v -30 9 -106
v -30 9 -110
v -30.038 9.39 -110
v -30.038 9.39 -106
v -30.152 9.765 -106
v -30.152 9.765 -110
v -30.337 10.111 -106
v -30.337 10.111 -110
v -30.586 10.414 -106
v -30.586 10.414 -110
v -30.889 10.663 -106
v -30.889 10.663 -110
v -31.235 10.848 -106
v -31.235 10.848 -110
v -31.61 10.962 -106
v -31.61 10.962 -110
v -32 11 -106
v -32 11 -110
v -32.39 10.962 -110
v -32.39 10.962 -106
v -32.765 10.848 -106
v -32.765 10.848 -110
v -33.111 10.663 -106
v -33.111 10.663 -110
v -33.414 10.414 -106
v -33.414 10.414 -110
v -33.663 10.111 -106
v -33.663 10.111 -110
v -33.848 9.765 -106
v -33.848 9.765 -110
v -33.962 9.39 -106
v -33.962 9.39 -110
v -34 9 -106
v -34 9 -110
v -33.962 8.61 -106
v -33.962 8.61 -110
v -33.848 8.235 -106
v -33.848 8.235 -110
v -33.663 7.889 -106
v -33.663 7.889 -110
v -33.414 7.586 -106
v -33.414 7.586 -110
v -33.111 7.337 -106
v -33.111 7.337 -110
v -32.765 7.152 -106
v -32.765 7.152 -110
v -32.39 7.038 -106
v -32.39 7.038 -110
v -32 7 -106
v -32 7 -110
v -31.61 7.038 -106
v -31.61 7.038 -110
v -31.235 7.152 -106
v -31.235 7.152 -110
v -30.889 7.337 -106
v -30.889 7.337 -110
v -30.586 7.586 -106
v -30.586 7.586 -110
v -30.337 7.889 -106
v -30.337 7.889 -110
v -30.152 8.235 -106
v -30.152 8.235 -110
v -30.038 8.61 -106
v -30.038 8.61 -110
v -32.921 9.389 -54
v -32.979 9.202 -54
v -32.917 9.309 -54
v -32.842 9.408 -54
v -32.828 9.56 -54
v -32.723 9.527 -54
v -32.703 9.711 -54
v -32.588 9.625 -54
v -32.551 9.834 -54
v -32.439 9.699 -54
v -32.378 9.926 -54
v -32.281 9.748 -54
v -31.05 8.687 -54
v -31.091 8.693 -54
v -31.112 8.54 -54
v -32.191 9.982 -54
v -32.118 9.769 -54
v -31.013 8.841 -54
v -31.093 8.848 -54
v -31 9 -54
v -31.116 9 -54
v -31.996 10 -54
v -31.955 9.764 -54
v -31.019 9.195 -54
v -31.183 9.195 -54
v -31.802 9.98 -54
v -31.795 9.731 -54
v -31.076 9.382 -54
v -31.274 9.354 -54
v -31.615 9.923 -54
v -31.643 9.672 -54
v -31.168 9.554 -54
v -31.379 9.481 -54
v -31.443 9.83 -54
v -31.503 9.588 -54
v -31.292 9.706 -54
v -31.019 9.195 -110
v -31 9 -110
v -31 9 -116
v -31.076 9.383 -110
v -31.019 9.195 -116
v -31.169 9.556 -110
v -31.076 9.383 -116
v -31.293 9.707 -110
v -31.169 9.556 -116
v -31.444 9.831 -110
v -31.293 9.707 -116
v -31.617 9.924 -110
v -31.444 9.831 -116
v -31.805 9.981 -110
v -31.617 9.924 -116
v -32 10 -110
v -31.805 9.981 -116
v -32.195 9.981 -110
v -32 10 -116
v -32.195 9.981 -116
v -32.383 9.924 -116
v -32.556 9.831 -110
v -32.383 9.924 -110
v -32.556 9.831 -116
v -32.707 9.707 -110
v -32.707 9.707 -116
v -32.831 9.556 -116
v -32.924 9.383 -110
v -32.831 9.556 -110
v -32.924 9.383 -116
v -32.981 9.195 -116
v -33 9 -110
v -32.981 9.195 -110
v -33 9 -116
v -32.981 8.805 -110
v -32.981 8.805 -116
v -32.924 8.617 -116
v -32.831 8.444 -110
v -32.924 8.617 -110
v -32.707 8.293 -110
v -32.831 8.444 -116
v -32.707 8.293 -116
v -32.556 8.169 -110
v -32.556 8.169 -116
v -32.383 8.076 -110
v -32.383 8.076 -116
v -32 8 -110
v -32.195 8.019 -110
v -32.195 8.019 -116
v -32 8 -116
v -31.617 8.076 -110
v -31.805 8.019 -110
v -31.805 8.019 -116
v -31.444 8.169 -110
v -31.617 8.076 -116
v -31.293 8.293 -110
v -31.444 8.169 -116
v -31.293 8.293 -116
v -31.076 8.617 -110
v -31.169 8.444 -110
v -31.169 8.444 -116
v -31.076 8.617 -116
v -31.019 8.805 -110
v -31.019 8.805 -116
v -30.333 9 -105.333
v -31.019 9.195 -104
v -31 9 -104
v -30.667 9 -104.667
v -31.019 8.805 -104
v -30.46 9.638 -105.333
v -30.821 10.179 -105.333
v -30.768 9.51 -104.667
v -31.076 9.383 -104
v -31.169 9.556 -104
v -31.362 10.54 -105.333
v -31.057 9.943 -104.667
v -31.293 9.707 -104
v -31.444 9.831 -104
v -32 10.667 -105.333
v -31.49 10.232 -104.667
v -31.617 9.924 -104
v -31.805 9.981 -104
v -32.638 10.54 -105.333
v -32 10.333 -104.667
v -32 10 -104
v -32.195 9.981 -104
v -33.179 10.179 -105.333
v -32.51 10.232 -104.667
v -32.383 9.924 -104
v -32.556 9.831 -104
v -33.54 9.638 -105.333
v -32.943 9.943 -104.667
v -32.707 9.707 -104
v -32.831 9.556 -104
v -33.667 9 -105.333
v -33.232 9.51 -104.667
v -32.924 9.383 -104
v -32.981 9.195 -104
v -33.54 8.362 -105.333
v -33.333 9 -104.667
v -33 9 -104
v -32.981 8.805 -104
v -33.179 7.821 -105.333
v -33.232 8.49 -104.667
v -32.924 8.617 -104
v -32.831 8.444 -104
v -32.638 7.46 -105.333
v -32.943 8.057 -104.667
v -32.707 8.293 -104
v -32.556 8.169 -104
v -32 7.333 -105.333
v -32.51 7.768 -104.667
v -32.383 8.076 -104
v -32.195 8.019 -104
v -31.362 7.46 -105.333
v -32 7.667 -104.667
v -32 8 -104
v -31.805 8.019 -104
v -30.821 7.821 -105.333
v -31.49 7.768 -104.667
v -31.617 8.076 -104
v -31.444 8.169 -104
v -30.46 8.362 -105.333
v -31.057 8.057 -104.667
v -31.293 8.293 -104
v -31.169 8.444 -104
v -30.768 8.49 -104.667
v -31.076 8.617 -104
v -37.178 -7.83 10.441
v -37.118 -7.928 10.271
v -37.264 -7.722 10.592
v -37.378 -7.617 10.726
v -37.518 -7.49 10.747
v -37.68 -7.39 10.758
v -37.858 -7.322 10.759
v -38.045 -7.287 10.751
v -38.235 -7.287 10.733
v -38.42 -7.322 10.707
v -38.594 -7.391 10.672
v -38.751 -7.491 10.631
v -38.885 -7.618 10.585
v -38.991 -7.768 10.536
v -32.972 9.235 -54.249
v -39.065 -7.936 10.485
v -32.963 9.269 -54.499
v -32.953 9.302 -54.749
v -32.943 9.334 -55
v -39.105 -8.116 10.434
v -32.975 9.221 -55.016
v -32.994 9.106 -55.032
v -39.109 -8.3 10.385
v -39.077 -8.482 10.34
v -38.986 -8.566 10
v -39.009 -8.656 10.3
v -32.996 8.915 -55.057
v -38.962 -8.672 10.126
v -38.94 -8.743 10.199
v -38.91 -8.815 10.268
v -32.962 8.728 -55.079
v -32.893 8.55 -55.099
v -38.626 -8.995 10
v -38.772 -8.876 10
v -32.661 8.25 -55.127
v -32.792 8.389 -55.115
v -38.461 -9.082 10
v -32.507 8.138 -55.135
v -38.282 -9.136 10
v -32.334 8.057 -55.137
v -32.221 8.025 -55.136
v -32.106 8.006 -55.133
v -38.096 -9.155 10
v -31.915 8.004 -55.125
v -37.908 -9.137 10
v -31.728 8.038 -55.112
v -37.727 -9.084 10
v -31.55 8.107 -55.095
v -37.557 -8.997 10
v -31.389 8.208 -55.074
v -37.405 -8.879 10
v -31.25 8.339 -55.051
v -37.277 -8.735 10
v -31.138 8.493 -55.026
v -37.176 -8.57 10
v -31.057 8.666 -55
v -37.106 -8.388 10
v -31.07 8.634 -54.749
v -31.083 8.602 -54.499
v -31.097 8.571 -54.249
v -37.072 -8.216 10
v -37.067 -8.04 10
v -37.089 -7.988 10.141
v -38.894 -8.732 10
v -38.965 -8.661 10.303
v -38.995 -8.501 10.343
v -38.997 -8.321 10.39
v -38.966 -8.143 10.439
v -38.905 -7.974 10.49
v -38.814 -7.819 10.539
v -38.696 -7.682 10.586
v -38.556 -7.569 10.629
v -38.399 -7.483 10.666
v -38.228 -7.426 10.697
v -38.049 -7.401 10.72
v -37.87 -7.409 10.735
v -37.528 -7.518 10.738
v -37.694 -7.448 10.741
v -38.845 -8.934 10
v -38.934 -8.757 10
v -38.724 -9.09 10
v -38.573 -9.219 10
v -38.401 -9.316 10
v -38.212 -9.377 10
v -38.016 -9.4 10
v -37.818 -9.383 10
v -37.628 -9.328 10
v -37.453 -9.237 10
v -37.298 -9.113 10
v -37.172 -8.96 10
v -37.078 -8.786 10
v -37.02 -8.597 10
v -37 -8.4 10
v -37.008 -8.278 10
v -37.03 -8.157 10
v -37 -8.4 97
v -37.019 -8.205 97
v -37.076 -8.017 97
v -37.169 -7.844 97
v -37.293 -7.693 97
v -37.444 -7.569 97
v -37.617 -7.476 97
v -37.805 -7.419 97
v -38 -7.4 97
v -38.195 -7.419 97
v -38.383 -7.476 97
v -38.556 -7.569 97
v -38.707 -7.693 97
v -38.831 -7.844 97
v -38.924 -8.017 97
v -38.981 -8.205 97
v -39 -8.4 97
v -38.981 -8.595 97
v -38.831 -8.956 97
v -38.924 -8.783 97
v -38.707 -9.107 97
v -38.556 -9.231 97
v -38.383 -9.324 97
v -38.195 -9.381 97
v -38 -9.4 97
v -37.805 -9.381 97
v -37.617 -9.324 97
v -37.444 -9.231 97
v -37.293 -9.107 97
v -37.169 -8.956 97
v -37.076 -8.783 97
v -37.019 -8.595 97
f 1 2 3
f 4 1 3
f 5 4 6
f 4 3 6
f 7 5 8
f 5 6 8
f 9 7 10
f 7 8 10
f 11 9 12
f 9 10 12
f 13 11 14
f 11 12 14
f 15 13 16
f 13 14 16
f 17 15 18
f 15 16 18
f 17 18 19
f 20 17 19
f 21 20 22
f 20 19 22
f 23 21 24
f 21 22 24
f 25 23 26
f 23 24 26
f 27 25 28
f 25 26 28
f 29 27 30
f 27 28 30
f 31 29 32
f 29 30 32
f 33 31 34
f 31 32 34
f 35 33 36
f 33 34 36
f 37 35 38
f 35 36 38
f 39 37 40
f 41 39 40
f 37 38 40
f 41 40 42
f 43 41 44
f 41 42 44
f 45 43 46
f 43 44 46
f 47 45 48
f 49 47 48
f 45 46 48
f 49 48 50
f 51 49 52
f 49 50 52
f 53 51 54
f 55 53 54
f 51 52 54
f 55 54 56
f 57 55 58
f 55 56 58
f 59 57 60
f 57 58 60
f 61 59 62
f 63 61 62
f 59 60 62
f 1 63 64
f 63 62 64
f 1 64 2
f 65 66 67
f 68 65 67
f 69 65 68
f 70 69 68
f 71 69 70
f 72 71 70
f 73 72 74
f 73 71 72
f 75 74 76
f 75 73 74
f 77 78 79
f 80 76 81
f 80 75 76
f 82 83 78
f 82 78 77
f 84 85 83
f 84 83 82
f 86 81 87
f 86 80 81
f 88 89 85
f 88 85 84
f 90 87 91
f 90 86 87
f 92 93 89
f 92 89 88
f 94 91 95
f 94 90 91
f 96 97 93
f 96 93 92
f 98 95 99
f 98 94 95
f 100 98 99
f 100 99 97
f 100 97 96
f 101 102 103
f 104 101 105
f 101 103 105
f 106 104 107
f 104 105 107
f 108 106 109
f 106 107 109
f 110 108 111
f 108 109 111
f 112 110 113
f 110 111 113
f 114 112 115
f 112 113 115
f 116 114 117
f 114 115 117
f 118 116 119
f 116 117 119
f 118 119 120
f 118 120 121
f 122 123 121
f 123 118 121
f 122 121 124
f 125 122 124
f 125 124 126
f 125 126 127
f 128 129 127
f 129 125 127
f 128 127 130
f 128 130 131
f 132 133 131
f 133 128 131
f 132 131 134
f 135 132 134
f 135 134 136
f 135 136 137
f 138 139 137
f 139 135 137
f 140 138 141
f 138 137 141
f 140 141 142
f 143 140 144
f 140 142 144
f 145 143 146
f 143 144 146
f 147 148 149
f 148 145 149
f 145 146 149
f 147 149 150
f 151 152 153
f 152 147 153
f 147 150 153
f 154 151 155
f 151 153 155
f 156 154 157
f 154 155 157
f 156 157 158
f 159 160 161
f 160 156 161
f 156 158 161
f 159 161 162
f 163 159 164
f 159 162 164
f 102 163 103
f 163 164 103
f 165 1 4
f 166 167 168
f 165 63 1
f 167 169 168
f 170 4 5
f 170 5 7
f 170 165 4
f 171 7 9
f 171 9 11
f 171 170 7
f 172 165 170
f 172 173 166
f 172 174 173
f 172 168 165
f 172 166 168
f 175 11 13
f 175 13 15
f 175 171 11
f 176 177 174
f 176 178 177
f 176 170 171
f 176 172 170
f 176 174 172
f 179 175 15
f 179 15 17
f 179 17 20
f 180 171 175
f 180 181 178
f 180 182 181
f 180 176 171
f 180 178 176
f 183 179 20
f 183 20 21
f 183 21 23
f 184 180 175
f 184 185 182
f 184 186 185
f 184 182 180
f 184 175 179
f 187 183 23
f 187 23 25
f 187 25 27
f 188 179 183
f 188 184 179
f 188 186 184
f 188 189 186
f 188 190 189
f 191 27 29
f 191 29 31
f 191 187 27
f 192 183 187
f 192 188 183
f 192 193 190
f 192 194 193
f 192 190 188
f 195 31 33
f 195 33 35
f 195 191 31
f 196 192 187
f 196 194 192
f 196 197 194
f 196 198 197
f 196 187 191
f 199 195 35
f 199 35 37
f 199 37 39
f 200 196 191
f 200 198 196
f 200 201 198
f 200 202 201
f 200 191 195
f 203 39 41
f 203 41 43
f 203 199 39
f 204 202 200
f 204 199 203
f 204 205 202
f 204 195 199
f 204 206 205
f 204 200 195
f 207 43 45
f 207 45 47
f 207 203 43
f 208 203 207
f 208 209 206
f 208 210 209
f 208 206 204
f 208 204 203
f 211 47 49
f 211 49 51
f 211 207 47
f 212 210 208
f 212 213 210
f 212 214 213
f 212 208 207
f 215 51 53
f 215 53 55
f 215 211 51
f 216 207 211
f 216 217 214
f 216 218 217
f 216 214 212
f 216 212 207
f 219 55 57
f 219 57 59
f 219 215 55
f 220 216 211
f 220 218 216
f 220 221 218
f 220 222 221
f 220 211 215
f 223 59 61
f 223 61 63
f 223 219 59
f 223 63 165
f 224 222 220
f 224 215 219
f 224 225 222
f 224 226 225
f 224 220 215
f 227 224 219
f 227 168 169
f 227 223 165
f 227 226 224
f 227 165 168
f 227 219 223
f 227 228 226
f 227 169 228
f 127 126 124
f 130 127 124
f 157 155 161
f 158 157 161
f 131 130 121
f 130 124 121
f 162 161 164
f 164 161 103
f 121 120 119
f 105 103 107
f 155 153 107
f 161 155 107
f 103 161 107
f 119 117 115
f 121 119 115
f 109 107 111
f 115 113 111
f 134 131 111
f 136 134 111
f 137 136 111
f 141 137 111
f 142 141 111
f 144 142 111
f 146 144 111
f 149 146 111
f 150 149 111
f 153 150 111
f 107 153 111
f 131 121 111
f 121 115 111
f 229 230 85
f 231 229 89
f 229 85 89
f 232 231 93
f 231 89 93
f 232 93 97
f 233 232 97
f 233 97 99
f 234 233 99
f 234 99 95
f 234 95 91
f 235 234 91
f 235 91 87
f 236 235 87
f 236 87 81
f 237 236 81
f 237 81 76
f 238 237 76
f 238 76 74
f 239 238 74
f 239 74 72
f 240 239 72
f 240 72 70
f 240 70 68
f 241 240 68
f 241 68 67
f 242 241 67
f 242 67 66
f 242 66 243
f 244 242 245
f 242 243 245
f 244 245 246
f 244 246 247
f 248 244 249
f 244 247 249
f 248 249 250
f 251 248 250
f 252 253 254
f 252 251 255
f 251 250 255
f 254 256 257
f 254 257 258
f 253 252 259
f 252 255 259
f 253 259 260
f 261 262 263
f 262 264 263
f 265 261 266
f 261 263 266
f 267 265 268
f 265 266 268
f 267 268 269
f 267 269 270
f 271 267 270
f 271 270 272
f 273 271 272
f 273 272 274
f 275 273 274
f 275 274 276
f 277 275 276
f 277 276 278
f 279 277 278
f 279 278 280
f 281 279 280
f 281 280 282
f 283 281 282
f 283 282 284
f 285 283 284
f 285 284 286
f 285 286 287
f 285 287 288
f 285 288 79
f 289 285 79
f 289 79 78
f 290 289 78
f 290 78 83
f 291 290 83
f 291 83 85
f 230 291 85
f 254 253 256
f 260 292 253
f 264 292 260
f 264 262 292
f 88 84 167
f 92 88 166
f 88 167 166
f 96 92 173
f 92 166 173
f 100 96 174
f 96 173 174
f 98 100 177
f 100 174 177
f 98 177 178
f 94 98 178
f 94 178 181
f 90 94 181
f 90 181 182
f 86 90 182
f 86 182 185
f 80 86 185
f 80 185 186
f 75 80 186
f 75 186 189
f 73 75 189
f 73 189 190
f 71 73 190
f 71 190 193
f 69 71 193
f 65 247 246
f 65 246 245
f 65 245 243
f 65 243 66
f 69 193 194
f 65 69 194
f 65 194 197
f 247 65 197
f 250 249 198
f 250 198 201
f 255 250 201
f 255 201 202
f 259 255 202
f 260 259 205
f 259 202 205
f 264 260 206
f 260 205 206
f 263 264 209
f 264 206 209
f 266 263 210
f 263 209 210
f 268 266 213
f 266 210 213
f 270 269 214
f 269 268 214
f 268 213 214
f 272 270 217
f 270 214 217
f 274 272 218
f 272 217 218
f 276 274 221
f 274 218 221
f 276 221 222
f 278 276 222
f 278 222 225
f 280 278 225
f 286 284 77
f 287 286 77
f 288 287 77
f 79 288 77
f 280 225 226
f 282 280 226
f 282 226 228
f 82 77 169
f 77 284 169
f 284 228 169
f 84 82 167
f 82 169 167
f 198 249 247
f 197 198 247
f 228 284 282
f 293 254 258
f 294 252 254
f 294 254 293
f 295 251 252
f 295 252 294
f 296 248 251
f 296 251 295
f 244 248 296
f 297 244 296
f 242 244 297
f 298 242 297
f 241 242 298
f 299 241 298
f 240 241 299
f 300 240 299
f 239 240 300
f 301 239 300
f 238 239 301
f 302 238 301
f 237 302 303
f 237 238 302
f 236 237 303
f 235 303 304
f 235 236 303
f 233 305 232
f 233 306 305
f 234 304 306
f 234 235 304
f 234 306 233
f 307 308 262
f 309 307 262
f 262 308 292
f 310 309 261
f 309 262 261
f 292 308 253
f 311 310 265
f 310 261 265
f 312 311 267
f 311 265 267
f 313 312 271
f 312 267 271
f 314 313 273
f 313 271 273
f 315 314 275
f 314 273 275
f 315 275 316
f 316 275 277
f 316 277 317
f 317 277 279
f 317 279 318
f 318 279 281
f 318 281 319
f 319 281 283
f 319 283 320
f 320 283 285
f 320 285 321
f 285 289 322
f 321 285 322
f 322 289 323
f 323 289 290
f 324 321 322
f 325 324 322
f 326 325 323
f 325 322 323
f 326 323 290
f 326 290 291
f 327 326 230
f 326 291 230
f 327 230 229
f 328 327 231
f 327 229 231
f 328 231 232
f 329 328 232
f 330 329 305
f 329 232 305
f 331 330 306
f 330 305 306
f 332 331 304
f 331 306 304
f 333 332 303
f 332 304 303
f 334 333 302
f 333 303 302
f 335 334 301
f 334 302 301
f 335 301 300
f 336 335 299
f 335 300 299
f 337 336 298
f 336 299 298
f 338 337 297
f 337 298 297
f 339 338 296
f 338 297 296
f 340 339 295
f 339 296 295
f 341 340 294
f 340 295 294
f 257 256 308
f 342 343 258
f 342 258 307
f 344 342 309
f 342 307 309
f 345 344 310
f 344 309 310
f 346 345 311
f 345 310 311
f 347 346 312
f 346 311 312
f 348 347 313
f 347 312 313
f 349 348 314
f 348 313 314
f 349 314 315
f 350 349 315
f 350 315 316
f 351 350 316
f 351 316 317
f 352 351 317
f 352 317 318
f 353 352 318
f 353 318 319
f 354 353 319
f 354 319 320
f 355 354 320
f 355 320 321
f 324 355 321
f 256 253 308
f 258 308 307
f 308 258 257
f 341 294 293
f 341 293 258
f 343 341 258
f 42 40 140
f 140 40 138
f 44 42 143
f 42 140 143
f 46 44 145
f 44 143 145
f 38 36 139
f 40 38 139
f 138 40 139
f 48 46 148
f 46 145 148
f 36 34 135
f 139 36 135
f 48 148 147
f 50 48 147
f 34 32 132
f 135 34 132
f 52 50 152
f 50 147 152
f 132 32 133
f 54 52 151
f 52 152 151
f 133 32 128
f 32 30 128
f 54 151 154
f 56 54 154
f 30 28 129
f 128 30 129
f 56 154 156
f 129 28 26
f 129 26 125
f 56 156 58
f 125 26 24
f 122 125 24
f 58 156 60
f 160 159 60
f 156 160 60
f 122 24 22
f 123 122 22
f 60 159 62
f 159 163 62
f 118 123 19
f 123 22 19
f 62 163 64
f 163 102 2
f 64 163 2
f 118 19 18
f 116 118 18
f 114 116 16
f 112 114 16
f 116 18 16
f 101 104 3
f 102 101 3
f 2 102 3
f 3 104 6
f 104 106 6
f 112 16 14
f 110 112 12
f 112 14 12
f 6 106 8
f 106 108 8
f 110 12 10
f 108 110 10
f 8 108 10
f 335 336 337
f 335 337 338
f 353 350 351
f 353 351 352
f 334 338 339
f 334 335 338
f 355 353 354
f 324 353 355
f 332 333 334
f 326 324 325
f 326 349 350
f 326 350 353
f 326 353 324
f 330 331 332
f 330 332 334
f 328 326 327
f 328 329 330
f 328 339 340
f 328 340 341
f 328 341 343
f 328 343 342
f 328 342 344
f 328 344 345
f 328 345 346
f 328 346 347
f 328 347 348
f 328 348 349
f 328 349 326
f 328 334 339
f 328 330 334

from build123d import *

# Parameters (mm, degrees)
CYLINDER068_R               = 1
CYLINDER068_DEPTH           = 68
CYLINDER068_ROLL_ANGLE      = 13.101784
CYLINDER068_PITCH_ANGLE     = -8.567577
CYLINDER068_PLACEMENT_ANGLE = 13.101784
CYLINDER054_R               = 1
CYLINDER054_DEPTH           = 50
CYLINDER065_R               = 1
CYLINDER065_DEPTH           = 87
CYLINDER052_R               = 2
CYLINDER052_DEPTH           = 4
CYLINDER053_R               = 1
CYLINDER053_DEPTH           = 8


with BuildPart() as cylindre064:
    # Cylinder068 → Cylinder068 (new body)
    with BuildSketch(Plane.XY):
        Circle(CYLINDER068_R)
    extrude(amount=CYLINDER068_DEPTH)


with BuildPart() as cylindre064_1:
    # Cylinder068 roll: moved
    add(cylindre064.part.rotate(Axis((0, 0, 0), (1, 0, 0)), CYLINDER068_ROLL_ANGLE))


with BuildPart() as cylindre064_2:
    # Cylinder068 pitch: moved
    add(cylindre064_1.part.rotate(Axis((0, 0, 0), (0, 1, 0)), CYLINDER068_PITCH_ANGLE))


with BuildPart() as cylindre064_3:
    # Cylinder068 placement: moved
    add(cylindre064_2.part.moved(Location((-32, 9, -55))).rotate(Axis((-32, 9, -55), (0, 0, 1)), CYLINDER068_PLACEMENT_ANGLE))


with BuildPart() as fusion031:
    # Cylinder054 → Cylinder054 (new body)
    with BuildSketch(Plane(origin=(-32, 9, -104), x_dir=(1, 0, 0), z_dir=(0, 0, 1))):
        Circle(CYLINDER054_R)
    extrude(amount=CYLINDER054_DEPTH)

    # Fusion031: union Cylindre064
    add(cylindre064_3.part)


with BuildPart() as fusion032:
    # Cylinder065 → Cylinder065 (new body)
    with BuildSketch(Plane(origin=(-38, -8.4, 10), x_dir=(1, 0, 0), z_dir=(0, 0, 1))):
        Circle(CYLINDER065_R)
    extrude(amount=CYLINDER065_DEPTH)

    # Fusion032: union Fusion031
    add(fusion031.part)


with BuildPart() as c_ne001:
    # Cone001 → Cone001 (revolve)
    with BuildSketch(Plane(origin=(-32, 9, -106), x_dir=(1, 0, 0), z_dir=(0, -1, 0))):
        Polygon((0, 0), (2, 0), (1, 2), (0, 2), align=None)
    revolve(axis=Axis((-32, 9, -106), (0, 0, 1)))


with BuildPart() as fusion033:
    # Cylinder052 → Cylinder052 (new body)
    with BuildSketch(Plane(origin=(-32, 9, -110), x_dir=(1, 0, 0), z_dir=(0, 0, 1))):
        Circle(CYLINDER052_R)
    extrude(amount=CYLINDER052_DEPTH)

    # Fusion026: union Cône001
    add(c_ne001.part)

    # Fusion033: union Fusion032
    add(fusion032.part)


with BuildPart() as fusion034:
    # Cylinder053 → Cylinder053 (new body)
    with BuildSketch(Plane(origin=(-32, 9, -116), x_dir=(1, 0, 0), z_dir=(0, 0, 1))):
        Circle(CYLINDER053_R)
    extrude(amount=CYLINDER053_DEPTH)

    # Fusion034: union Fusion033
    add(fusion033.part)


solid = fusion034.part
